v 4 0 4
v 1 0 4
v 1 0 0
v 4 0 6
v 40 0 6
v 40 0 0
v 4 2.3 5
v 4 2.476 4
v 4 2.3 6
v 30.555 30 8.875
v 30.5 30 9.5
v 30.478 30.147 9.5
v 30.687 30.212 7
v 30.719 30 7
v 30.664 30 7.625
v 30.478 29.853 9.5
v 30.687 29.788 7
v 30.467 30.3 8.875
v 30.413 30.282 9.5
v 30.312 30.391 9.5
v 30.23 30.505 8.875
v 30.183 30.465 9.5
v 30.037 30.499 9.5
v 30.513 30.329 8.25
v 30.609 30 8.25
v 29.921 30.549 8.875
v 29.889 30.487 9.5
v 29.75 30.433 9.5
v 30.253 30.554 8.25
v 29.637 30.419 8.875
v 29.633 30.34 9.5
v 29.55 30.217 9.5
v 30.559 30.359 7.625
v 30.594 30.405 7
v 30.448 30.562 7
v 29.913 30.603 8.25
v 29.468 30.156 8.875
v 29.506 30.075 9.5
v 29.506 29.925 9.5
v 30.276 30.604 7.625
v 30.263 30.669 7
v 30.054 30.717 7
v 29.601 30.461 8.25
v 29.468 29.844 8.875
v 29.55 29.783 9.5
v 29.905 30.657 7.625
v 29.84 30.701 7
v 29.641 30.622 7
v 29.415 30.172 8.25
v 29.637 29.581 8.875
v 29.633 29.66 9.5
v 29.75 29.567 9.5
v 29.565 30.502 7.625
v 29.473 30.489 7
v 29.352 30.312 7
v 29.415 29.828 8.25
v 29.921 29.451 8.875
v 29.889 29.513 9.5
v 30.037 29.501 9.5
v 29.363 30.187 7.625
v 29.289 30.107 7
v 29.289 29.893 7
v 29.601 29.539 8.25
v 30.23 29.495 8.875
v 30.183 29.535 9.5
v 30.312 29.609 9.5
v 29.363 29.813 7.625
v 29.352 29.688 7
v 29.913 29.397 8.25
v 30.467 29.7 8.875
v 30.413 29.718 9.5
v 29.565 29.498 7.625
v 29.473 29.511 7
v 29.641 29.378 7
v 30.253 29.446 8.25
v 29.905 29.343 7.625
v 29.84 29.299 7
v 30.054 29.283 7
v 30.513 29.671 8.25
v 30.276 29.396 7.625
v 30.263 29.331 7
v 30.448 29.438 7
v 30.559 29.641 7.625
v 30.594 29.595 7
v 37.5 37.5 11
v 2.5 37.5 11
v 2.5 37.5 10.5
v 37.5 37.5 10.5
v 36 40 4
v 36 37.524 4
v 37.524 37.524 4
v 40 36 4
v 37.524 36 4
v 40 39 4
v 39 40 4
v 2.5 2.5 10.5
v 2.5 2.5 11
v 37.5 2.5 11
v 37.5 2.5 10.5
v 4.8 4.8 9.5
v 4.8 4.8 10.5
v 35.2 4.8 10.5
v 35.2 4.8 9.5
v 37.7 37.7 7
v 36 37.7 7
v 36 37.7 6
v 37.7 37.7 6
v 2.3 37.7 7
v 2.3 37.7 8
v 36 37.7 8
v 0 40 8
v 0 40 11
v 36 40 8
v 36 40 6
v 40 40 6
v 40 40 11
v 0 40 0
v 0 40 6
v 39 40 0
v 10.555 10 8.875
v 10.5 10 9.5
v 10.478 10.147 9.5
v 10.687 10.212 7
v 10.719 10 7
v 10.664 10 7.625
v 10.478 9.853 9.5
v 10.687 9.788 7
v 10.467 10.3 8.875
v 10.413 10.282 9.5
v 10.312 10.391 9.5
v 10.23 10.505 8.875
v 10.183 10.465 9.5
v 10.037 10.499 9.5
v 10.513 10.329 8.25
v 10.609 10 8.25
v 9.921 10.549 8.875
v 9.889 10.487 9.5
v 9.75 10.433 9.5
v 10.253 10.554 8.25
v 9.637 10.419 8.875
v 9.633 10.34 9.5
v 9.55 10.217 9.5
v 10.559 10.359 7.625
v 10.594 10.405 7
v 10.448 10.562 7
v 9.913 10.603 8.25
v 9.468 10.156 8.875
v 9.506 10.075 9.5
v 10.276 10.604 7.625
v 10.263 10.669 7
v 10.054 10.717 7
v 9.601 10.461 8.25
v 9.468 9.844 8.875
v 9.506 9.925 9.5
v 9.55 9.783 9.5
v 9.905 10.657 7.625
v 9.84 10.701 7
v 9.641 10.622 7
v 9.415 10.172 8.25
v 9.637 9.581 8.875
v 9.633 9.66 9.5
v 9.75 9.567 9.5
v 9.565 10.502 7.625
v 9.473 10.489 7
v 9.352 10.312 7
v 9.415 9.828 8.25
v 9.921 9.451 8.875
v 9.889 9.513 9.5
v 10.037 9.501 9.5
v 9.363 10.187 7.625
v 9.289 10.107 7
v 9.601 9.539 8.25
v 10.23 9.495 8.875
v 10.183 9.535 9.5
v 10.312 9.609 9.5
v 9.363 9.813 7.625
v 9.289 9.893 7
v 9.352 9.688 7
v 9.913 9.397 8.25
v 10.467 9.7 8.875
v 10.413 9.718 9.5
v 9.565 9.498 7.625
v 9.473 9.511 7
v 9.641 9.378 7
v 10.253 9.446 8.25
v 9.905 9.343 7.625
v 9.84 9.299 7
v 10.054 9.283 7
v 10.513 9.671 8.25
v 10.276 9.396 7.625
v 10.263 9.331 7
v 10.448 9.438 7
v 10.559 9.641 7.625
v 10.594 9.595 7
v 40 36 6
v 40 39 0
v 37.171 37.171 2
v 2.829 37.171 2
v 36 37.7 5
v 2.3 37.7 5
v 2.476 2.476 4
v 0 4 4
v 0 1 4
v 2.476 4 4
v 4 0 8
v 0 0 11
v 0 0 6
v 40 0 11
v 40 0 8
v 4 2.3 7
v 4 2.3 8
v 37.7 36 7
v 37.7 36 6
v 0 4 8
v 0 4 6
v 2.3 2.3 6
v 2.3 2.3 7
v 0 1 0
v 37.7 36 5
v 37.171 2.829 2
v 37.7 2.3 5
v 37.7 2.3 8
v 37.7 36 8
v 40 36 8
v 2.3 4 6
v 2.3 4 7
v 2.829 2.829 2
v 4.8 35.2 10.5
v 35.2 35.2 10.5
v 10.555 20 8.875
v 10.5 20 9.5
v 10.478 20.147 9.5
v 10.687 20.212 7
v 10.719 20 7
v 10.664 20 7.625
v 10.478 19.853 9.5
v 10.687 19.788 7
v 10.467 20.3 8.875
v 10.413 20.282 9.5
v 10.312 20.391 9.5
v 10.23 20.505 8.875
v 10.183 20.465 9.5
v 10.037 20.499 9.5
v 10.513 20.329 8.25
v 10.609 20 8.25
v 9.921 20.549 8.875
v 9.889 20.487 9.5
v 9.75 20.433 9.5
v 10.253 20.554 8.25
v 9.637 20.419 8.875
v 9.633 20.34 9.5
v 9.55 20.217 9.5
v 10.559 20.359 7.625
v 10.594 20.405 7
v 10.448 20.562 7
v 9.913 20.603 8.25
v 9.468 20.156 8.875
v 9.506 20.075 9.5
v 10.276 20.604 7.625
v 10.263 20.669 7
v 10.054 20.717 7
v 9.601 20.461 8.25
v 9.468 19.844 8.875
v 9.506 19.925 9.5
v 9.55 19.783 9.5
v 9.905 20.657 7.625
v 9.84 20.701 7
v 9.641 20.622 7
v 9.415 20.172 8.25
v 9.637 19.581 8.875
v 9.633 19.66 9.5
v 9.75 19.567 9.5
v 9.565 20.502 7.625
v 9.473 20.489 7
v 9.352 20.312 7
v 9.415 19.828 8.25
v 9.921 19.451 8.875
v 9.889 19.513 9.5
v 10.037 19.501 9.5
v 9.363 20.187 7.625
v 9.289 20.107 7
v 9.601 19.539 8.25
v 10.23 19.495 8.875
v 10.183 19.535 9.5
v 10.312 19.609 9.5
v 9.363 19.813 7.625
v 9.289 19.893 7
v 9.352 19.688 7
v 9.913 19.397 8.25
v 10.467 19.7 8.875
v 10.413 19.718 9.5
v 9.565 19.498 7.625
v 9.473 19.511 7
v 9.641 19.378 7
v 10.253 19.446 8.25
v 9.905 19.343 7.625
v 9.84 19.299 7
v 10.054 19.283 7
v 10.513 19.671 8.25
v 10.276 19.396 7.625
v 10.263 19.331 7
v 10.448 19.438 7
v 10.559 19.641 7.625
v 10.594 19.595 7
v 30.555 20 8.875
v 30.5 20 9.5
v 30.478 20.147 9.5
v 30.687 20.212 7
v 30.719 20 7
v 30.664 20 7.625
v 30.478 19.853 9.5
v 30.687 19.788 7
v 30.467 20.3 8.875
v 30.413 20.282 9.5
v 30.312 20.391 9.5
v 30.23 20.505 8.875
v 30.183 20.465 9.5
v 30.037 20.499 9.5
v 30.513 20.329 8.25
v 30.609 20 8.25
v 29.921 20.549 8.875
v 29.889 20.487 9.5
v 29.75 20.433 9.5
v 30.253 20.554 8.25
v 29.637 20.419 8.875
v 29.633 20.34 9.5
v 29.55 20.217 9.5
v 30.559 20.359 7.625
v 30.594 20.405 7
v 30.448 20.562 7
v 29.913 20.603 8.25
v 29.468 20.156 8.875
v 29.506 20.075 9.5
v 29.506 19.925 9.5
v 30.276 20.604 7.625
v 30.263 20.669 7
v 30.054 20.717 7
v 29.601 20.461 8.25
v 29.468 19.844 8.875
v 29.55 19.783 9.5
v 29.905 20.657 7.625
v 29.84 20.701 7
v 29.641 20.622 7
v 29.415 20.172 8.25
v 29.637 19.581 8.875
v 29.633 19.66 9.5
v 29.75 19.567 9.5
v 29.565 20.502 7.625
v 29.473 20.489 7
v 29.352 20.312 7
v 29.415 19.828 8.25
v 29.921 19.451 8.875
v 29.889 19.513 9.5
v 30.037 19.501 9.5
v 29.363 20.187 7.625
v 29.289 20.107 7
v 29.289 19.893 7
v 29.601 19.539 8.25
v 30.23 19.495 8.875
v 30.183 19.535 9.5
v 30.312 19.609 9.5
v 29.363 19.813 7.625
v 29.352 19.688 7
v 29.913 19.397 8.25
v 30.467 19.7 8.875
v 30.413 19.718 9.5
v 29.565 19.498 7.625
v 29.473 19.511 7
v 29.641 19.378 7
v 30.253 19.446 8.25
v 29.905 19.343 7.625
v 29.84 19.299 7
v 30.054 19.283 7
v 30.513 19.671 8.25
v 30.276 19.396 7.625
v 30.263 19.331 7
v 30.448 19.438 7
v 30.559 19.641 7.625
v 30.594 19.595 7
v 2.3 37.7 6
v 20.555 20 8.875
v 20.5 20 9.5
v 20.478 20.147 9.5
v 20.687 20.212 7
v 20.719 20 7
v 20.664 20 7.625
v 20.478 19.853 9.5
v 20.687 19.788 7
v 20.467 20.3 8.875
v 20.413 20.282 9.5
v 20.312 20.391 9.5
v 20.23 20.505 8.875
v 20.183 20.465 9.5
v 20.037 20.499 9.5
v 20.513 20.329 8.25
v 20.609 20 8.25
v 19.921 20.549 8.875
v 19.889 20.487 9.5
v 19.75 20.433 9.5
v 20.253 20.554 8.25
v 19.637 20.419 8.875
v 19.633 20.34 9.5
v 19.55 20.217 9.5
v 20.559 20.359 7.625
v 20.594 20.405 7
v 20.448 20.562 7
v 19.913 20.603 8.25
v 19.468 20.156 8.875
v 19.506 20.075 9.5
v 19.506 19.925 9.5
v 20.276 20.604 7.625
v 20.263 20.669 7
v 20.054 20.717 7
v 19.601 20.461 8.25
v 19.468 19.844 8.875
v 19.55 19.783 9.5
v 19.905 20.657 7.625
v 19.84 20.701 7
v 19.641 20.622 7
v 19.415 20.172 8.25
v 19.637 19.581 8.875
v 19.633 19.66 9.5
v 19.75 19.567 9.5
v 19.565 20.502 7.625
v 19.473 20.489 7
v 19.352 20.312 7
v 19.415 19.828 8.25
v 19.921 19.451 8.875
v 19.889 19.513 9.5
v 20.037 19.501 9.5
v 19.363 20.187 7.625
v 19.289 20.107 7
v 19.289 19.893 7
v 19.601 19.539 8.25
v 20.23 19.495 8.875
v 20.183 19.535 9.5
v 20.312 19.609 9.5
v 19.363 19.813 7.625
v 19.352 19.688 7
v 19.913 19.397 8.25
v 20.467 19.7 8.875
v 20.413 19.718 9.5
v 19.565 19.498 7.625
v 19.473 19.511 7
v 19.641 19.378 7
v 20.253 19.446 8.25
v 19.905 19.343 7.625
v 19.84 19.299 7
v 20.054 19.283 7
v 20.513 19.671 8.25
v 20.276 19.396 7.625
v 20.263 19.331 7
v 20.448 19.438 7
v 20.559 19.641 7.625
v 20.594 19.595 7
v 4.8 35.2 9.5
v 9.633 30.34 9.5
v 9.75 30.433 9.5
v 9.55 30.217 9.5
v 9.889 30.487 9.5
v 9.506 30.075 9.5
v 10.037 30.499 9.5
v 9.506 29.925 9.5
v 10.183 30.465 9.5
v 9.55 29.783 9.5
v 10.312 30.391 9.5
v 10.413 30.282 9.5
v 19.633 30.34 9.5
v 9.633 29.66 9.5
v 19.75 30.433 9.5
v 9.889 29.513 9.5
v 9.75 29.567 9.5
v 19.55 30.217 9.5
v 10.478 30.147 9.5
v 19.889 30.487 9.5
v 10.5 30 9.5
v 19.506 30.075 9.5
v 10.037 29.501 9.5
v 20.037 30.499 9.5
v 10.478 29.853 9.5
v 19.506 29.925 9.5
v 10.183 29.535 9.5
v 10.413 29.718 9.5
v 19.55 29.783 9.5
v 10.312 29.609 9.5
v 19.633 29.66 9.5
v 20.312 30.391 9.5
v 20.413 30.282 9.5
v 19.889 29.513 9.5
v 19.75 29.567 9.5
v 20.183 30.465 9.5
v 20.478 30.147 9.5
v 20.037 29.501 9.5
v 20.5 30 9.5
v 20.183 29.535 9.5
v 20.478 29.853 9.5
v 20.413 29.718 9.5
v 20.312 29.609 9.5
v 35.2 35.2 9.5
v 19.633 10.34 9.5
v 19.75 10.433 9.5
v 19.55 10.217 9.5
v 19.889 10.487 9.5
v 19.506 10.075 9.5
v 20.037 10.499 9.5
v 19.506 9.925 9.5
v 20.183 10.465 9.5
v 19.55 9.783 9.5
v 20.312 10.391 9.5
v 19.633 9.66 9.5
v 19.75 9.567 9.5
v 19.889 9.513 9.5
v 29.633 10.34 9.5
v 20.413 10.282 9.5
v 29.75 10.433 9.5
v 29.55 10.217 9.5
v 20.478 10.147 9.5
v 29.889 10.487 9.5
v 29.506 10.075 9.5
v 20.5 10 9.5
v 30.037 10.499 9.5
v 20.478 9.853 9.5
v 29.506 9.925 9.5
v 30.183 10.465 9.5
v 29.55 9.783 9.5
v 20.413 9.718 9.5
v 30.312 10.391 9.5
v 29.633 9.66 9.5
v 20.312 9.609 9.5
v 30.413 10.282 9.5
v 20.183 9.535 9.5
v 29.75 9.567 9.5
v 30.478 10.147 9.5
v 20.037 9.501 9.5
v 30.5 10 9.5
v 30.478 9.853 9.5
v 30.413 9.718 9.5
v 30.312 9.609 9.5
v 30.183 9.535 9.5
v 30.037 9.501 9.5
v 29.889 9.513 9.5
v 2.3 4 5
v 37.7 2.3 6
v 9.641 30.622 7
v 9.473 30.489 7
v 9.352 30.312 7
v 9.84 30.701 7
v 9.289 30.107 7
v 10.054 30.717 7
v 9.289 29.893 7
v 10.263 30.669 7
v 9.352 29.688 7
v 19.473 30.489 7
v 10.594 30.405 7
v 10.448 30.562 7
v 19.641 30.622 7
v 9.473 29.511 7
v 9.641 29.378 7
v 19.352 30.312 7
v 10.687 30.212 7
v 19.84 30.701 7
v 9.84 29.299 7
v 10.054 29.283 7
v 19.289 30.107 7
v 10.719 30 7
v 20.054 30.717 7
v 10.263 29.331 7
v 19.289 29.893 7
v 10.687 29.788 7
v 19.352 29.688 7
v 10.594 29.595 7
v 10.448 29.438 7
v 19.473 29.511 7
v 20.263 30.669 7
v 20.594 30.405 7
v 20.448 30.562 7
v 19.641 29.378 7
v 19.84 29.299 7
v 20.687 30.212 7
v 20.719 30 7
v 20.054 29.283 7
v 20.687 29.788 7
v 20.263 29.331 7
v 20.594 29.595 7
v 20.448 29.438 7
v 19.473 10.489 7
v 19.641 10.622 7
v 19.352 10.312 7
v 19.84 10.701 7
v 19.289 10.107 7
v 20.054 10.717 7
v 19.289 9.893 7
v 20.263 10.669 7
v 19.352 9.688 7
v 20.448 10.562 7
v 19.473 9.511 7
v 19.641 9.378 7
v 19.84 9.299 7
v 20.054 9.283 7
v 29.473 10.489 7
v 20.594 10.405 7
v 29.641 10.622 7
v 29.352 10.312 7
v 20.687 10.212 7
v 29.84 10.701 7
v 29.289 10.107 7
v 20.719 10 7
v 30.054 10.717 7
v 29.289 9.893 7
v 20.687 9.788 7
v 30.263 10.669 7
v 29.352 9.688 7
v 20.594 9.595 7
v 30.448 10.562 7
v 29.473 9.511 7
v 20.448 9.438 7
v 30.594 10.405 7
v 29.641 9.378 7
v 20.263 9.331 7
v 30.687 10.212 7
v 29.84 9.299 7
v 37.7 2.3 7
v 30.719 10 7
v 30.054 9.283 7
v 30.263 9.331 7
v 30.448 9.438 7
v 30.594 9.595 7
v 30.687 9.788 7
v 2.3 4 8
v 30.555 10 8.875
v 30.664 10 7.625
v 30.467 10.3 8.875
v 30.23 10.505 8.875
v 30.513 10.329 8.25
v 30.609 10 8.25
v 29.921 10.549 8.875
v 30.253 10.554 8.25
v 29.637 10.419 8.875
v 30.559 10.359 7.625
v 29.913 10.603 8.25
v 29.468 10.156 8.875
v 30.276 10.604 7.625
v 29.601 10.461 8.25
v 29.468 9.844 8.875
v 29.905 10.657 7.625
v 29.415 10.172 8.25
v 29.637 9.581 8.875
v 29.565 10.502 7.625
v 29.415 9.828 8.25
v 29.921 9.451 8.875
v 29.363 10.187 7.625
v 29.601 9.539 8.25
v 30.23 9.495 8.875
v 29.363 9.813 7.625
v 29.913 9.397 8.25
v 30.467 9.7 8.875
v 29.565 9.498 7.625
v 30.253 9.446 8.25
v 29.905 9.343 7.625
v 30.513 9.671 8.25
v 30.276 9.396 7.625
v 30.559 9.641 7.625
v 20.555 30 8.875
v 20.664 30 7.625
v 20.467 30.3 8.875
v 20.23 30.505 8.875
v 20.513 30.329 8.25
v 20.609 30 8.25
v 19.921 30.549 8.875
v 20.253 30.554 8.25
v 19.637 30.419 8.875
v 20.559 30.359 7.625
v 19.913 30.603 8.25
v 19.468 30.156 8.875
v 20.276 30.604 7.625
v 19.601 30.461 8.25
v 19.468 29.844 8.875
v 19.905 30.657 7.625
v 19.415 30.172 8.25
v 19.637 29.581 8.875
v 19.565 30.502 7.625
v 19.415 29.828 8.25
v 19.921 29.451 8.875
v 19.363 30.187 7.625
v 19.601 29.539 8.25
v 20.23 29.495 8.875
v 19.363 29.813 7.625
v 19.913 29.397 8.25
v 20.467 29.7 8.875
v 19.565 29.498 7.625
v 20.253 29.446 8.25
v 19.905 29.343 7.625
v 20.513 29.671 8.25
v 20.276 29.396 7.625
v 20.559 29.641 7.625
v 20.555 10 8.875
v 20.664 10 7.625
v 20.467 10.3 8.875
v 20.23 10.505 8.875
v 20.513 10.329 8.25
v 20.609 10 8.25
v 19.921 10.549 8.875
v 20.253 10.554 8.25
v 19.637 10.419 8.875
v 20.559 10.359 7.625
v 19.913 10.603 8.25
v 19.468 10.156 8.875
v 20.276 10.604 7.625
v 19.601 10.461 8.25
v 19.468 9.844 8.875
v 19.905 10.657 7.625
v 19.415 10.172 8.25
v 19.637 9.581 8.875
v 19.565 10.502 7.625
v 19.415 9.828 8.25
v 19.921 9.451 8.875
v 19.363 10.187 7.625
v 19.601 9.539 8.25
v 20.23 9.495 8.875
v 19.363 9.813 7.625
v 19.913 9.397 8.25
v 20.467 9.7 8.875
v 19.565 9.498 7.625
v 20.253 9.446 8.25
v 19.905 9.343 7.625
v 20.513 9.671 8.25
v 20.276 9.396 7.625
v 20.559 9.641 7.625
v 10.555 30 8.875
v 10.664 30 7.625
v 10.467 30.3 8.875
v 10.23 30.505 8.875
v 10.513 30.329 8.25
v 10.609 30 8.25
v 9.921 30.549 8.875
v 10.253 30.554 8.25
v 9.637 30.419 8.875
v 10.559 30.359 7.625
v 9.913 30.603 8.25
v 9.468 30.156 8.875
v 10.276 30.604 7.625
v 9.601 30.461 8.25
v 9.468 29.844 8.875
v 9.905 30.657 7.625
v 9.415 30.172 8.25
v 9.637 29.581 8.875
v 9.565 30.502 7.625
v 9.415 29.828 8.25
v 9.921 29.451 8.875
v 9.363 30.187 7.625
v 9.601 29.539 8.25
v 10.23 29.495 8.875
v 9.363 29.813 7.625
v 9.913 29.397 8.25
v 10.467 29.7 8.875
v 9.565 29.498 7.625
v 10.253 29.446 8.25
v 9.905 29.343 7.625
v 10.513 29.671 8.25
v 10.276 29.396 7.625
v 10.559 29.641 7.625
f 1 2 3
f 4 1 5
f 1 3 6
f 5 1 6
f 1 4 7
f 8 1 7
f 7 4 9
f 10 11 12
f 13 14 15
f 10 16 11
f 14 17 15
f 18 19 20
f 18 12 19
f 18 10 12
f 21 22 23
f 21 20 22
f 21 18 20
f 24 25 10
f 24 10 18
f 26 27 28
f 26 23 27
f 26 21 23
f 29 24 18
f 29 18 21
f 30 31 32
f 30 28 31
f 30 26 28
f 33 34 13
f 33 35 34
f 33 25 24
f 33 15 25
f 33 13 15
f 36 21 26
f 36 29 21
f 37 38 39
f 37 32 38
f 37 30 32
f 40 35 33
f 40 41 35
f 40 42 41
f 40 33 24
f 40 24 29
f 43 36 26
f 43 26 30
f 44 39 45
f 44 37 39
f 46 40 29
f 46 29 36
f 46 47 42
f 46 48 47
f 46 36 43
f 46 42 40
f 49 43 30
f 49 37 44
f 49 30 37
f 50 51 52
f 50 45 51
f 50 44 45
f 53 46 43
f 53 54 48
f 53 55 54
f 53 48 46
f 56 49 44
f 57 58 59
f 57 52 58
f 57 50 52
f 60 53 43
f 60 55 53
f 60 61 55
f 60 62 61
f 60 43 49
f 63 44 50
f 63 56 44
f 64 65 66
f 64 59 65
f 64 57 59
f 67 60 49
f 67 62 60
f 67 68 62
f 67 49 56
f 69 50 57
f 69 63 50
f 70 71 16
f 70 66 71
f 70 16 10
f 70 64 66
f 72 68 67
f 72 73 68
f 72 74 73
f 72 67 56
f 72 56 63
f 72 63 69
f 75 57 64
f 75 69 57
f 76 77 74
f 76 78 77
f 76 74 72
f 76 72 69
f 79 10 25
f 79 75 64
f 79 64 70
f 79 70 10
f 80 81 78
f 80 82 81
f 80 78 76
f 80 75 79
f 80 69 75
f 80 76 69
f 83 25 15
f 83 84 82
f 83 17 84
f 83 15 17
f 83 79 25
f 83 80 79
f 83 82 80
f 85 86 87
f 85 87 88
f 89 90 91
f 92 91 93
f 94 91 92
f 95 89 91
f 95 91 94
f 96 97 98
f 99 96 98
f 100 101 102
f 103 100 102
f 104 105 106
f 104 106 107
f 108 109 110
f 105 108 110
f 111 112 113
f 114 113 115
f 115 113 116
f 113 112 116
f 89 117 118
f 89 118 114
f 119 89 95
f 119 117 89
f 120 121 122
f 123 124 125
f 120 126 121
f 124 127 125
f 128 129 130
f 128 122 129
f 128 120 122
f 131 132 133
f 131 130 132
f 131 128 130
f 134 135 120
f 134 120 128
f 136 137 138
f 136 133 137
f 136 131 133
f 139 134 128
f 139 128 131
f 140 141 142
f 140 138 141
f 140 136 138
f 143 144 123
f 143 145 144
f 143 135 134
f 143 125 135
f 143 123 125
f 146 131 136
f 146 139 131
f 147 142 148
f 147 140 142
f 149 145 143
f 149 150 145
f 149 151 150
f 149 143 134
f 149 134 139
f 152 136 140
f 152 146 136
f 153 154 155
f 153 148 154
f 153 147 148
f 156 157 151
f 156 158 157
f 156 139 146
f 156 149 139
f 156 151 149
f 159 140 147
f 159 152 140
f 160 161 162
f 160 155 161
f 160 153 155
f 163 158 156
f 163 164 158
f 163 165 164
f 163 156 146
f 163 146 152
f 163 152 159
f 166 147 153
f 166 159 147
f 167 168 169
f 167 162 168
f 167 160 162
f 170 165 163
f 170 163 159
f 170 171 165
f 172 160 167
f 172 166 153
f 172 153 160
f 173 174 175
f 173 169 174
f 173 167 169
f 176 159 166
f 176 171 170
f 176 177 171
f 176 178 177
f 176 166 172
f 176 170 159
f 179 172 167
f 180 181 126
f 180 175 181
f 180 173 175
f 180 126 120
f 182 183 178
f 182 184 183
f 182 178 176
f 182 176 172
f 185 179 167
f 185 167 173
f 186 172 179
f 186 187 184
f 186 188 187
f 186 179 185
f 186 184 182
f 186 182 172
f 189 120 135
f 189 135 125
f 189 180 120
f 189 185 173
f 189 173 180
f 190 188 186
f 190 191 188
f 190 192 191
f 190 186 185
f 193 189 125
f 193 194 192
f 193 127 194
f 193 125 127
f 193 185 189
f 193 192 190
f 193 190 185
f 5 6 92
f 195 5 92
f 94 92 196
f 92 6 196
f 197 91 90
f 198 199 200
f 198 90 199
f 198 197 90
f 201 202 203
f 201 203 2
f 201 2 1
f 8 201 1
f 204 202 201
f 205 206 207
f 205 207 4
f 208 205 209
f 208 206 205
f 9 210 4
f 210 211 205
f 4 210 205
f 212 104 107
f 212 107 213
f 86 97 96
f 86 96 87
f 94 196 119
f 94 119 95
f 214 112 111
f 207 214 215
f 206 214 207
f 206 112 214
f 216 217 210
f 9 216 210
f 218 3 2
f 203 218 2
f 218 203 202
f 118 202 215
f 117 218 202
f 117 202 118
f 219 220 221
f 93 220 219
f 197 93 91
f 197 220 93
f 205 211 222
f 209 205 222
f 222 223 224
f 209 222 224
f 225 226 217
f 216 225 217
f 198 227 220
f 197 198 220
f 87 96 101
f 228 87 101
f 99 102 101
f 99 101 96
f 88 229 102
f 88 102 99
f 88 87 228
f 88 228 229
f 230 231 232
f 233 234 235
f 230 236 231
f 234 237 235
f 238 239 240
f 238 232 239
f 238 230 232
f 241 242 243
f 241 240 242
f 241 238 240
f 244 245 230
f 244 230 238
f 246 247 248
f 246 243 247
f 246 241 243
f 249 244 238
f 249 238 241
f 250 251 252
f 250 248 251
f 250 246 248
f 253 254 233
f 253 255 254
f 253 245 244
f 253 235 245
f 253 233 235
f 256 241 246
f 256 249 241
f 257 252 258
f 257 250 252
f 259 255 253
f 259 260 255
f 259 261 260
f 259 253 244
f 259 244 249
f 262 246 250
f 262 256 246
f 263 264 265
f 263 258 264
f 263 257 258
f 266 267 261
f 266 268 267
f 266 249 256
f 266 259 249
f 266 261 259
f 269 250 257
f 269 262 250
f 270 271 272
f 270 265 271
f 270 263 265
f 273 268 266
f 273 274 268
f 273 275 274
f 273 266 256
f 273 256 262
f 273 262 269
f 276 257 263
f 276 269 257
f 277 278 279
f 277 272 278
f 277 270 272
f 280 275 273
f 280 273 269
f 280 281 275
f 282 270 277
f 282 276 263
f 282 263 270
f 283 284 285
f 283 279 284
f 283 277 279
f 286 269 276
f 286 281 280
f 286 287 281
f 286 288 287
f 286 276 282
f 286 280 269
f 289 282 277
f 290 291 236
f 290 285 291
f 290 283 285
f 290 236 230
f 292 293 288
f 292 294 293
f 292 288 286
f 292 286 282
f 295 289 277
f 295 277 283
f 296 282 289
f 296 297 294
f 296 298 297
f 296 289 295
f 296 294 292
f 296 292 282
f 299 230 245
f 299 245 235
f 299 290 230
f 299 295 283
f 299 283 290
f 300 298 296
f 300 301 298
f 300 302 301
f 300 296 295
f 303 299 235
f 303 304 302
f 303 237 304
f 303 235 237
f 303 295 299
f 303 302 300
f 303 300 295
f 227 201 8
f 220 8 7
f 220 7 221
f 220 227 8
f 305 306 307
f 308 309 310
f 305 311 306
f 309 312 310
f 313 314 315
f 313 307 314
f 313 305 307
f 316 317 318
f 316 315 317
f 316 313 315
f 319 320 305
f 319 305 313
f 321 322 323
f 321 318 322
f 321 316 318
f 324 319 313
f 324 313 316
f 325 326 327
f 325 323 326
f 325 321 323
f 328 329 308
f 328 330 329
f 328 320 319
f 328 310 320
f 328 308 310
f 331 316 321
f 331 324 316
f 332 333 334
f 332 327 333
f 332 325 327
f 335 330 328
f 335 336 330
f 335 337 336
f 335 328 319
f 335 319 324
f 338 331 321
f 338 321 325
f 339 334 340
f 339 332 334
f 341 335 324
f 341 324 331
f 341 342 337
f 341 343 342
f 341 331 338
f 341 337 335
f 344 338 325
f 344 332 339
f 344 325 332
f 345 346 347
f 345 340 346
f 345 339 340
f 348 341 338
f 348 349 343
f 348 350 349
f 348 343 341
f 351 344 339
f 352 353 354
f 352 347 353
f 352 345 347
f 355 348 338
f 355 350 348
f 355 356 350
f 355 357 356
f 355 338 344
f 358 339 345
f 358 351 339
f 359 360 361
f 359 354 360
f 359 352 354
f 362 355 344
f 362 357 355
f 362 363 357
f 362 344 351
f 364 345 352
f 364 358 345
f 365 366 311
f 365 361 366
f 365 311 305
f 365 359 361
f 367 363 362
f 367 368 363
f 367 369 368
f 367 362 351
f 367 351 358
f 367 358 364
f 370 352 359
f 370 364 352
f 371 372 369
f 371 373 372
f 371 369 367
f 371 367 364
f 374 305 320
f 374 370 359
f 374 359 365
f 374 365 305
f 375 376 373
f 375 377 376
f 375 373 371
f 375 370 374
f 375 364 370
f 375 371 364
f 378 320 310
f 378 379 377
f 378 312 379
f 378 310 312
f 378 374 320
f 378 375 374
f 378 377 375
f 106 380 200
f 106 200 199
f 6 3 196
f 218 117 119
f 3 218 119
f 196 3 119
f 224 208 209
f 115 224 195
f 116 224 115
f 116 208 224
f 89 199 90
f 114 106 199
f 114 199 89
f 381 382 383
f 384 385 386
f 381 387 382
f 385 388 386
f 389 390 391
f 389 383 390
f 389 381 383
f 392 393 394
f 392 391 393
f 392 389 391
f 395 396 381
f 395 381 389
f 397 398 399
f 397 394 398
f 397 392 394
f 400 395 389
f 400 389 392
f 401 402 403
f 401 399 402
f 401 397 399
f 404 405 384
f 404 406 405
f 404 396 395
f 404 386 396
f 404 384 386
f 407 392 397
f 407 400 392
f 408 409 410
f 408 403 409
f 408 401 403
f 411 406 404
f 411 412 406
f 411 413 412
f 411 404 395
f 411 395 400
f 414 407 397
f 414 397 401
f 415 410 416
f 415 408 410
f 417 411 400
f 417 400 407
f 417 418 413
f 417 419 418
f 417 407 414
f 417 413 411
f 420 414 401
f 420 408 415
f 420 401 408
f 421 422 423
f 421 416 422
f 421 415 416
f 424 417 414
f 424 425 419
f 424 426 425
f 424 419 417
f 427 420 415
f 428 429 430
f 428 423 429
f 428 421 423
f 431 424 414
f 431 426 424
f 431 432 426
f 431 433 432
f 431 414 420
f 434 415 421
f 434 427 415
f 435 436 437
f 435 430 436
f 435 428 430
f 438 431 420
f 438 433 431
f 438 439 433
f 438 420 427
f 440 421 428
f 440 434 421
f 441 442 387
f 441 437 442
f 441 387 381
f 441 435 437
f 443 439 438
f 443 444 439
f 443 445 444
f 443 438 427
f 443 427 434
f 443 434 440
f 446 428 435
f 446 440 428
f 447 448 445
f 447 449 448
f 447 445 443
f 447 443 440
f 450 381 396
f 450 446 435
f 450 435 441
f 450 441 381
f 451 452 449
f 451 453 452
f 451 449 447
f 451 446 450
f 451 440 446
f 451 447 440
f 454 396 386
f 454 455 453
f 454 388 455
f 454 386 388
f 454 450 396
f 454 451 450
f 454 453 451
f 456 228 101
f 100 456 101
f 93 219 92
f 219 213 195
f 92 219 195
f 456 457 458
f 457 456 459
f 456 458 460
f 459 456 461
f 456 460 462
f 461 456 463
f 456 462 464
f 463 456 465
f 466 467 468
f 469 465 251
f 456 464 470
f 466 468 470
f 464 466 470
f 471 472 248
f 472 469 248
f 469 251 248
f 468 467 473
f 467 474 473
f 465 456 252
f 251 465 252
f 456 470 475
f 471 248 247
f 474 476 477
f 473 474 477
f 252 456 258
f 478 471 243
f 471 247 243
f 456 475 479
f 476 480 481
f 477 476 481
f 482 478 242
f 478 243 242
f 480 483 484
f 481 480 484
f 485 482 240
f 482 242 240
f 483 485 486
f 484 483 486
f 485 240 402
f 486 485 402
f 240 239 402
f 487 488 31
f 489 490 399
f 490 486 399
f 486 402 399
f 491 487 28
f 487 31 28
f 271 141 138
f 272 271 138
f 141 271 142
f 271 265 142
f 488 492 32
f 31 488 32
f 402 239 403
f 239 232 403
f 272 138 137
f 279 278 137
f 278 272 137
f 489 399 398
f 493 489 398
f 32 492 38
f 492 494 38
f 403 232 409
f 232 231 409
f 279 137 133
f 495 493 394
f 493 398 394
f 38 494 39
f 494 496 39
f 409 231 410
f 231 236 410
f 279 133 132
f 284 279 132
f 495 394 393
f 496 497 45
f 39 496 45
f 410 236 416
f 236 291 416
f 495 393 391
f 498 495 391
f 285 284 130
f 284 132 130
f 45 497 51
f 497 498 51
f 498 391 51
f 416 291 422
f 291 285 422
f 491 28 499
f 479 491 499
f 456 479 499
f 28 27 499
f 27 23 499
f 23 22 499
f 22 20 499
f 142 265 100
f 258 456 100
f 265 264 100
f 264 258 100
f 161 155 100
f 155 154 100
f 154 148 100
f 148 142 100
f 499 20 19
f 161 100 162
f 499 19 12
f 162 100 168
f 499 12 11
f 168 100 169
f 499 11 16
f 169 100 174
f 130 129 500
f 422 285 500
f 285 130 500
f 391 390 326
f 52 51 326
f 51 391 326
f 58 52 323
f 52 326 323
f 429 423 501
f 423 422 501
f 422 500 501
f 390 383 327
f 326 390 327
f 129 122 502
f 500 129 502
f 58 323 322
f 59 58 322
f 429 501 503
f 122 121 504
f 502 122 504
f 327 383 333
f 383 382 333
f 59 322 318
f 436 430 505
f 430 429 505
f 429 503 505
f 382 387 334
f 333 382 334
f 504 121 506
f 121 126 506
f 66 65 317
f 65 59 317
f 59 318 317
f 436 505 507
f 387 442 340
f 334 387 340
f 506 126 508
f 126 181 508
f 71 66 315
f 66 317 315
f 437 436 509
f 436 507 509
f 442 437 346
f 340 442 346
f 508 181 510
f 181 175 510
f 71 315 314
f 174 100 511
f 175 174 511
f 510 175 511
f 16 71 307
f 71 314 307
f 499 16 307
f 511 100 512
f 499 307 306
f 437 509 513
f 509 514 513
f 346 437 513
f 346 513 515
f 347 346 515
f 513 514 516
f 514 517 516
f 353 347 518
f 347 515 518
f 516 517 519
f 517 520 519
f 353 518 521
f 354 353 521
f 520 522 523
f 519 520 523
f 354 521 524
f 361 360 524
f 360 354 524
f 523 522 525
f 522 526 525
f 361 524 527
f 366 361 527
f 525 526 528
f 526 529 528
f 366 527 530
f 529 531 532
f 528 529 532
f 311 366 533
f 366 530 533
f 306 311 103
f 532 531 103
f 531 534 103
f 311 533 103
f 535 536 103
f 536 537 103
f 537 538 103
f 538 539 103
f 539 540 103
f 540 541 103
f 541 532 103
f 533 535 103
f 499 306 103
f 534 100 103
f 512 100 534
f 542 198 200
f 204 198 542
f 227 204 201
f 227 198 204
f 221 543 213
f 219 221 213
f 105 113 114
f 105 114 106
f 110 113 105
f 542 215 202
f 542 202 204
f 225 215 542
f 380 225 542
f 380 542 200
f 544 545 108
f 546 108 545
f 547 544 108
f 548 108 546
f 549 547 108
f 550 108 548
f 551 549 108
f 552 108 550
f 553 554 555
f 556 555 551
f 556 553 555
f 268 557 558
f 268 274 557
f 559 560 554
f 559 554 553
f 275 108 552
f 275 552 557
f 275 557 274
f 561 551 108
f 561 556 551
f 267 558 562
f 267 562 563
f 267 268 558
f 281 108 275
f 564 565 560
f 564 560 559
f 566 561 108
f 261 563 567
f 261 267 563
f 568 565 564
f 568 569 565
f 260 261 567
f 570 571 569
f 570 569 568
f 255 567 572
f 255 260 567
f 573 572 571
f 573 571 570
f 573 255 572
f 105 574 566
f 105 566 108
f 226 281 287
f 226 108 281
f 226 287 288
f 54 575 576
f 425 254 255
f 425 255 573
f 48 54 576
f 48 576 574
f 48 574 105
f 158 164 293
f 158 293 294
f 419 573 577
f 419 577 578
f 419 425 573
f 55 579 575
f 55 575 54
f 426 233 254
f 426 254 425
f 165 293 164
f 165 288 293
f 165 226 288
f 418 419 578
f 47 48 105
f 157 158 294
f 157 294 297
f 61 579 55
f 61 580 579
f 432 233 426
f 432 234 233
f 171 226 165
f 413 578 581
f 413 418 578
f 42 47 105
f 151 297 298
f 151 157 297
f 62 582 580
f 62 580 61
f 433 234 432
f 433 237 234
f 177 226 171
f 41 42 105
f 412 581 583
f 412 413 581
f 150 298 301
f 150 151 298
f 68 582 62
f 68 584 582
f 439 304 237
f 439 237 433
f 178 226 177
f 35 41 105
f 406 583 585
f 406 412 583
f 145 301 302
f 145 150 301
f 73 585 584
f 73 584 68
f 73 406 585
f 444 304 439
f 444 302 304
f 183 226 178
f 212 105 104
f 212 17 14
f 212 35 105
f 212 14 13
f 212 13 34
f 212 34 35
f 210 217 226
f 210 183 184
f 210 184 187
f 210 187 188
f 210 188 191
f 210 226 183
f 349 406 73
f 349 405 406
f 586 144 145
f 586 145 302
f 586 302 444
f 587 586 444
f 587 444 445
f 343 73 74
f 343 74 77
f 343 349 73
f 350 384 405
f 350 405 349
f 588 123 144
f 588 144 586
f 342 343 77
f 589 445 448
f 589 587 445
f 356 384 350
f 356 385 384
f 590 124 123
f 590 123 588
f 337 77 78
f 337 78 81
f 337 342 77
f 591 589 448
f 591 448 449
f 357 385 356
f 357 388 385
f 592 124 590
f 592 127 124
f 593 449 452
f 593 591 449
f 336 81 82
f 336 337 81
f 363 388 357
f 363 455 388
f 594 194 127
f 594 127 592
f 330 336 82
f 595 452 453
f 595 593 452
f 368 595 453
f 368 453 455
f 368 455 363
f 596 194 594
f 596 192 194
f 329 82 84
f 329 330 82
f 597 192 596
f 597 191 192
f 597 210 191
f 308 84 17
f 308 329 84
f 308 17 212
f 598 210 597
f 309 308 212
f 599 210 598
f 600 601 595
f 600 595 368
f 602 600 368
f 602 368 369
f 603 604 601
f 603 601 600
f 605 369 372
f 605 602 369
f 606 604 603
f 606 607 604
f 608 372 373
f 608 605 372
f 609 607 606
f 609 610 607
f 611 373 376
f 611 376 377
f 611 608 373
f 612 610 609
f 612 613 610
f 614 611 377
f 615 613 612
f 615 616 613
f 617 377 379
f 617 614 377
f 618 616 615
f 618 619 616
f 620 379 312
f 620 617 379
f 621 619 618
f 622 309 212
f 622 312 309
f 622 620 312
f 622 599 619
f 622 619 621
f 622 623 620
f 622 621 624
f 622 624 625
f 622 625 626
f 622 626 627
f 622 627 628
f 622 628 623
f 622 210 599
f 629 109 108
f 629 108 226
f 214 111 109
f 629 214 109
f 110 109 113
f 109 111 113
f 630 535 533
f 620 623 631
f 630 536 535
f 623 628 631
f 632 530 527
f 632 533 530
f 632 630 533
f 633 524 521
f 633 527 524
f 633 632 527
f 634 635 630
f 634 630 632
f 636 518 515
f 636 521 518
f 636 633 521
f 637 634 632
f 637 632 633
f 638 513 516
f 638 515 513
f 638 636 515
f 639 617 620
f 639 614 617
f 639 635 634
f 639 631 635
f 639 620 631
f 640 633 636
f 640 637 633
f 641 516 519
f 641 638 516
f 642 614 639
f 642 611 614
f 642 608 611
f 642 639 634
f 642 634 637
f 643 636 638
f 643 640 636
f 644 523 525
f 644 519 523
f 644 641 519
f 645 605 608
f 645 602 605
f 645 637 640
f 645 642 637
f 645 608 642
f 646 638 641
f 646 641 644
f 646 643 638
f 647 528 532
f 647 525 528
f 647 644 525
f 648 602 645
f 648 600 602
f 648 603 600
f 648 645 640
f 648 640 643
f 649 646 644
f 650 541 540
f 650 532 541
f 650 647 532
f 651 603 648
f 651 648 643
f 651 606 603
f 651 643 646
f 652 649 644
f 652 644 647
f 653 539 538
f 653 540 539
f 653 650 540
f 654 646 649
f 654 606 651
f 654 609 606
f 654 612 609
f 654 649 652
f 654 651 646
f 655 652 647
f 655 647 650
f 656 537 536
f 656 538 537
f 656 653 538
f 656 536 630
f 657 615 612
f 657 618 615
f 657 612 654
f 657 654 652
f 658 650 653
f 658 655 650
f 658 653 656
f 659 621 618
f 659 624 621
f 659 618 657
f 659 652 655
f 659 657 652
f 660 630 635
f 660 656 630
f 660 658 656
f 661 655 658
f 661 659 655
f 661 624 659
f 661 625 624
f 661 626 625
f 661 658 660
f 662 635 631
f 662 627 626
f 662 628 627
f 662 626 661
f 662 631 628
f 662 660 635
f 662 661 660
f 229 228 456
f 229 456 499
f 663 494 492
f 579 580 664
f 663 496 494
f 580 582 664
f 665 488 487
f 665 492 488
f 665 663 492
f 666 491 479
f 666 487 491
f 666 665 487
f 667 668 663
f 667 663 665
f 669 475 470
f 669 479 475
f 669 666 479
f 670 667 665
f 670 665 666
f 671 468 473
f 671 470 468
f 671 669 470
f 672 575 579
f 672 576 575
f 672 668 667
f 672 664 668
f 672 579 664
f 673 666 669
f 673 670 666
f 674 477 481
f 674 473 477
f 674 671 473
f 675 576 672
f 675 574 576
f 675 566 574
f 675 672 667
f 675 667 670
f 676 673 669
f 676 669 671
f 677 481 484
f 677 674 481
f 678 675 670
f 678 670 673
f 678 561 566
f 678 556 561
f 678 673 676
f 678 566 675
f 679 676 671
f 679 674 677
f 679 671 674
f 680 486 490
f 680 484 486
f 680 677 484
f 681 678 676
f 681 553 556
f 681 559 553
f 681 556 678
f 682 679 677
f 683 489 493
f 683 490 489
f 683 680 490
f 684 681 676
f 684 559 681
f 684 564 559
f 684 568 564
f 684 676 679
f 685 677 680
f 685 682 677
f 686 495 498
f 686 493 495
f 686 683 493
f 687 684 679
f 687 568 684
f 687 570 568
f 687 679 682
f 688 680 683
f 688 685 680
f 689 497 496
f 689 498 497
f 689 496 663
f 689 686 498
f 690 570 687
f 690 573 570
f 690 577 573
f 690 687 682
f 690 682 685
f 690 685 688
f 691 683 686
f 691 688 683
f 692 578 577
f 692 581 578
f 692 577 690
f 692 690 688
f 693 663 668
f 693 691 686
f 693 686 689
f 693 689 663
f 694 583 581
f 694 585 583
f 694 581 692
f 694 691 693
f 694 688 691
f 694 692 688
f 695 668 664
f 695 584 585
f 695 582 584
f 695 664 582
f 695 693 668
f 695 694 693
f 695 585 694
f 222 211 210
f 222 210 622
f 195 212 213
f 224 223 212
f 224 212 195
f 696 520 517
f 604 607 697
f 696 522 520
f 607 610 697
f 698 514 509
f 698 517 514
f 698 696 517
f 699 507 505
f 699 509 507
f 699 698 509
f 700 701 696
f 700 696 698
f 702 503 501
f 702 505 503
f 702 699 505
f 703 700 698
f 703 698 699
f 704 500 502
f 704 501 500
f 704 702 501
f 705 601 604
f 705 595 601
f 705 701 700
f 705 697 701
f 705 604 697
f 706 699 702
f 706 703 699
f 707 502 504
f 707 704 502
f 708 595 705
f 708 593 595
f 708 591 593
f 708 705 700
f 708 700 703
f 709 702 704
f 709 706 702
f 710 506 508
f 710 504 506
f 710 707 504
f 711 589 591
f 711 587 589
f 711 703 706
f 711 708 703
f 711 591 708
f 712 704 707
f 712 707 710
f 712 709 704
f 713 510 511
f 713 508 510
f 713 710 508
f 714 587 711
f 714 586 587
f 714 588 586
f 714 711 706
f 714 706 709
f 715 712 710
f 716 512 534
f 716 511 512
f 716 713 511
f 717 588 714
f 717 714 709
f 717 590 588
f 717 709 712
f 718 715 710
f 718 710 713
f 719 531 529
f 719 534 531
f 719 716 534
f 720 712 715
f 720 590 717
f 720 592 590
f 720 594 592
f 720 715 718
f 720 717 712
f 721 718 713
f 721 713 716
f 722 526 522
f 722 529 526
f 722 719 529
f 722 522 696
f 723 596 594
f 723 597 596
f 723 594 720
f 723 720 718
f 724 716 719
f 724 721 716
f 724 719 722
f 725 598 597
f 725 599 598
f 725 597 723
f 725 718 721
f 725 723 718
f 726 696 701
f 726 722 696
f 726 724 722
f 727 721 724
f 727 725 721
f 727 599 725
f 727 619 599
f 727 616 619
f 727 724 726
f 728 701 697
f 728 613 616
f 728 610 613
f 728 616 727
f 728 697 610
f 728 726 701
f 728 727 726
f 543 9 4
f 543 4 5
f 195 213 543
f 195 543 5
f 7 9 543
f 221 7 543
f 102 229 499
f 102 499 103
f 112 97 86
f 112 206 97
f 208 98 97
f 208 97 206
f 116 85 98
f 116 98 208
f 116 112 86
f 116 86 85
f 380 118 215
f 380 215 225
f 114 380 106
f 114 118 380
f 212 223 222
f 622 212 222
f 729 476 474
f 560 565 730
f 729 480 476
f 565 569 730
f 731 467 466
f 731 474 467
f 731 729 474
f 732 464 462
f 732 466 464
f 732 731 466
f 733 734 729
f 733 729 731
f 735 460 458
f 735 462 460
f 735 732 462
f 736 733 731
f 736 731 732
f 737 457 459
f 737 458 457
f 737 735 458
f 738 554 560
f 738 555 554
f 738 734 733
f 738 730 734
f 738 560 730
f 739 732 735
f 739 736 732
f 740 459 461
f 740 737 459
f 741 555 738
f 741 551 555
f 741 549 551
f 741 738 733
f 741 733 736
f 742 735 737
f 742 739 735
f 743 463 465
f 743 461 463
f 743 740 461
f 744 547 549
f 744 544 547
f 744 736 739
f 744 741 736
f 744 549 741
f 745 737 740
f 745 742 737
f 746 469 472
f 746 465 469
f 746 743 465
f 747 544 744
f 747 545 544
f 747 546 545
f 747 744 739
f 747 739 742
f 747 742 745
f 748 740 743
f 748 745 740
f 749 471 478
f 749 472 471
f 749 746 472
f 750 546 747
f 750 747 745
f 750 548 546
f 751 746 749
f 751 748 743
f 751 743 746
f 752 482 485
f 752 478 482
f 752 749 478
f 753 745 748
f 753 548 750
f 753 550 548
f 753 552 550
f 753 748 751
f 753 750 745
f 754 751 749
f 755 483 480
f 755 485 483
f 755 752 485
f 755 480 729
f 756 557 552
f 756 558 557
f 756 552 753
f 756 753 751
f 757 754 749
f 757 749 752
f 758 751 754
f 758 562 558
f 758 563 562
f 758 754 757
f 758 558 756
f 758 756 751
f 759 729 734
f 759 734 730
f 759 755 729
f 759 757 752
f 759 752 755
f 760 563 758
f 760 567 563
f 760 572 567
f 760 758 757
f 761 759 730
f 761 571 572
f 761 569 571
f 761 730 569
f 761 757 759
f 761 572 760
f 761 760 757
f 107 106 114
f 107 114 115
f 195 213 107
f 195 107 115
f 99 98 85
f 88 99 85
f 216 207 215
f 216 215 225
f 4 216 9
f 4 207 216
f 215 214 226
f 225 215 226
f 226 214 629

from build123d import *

# Parameters (mm, degrees)
F0_W      = 40
F0_H      = 40
F1_DEPTH  = 6
F4_W      = 40
F4_H      = 40
F5_DEPTH  = 3
F2_W      = 35.4
F2_H      = 35.4
F6_DEPTH  = 1
F6_FACE_W = 35.4
F6_FACE_H = 35.4
F7_DEPTH  = 3
F7_TAPER  = 10
F9_W      = 35.4
F9_H      = 35.4
F10_DEPTH = 1
F11_T     = -2.5
F12_R     = 0.5
F13_DEPTH = 2.5
F13_TAPER = -5
F14_SIZE  = 1
F17_W     = 4
F17_H     = 4
F18_DEPTH = 2
F19_W     = 35.4
F19_H     = 35.4
F20_DEPTH = 25
F15_W     = 4
F15_H     = 4
F21_DEPTH = 2


with BuildPart() as f1:
    # F0 (on Top) → F1 (new body)
    with BuildSketch(Plane.XY):
        with Locations((20, 20)):
            Rectangle(F0_W, F0_H)
    extrude(amount=F1_DEPTH)

    # F2 (on face) → F6 (cut)
    with BuildSketch(Plane.XY.offset(6)):
        with Locations((20, 20)):
            Rectangle(F2_W, F2_H)
    extrude(amount=-F6_DEPTH, mode=Mode.SUBTRACT)

    # F6_face (on face) → F7 (cut)
    with BuildSketch(Plane(origin=(20, 20, 5), x_dir=(1, 0, 0), z_dir=(0, 0, 1))):
        Rectangle(F6_FACE_W, F6_FACE_H)
    extrude(amount=-F7_DEPTH, taper=F7_TAPER, mode=Mode.SUBTRACT)

    # F14
    f14_edges = [f1.edges().sort_by_distance(p)[0] for p in [
        (0, 0, 3),
        (40, 40, 3),
    ]]
    chamfer(f14_edges, length=F14_SIZE)

    # F15 (on face) → F21 (cut)
    with BuildSketch(Plane.XY.offset(6)):
        with Locations((2, 2)):
            Rectangle(F15_W, F15_H)
        with Locations((38, 38)):
            Rectangle(F15_W, F15_H)
    extrude(amount=-F21_DEPTH, mode=Mode.SUBTRACT)


with BuildPart() as f5:
    # F4 (on offset) → F5 (new body)
    with BuildSketch(Plane.XY.offset(11)):
        with Locations((20, 20)):
            Rectangle(F4_W, F4_H)
    extrude(amount=-F5_DEPTH)

    # F9 (on face) → F10 (join)
    with BuildSketch(Plane(origin=(0, 0, 8), x_dir=(1, 0, 0), z_dir=(0, 0, -1))):
        with Locations((20, -20)):
            Rectangle(F9_W, F9_H)
    extrude(amount=F10_DEPTH)

    # F11
    f11_openings = [f5.faces().sort_by_distance(p)[0] for p in [
        (20, 20, 11),
    ]]
    offset(amount=F11_T, openings=f11_openings, kind=Kind.INTERSECTION)

    # F12 (on face) → F13 (cut, through all)
    with BuildSketch(Plane.XY.offset(9.5)):
        with Locations((10, 30)):
            Circle(F12_R)
        with Locations((20, 30)):
            Circle(F12_R)
        with Locations((30, 30)):
            Circle(F12_R)
        with Locations((10, 20)):
            Circle(F12_R)
        with Locations((10, 10)):
            Circle(F12_R)
        with Locations((20, 20)):
            Circle(F12_R)
        with Locations((20, 10)):
            Circle(F12_R)
        with Locations((30, 20)):
            Circle(F12_R)
        with Locations((30, 10)):
            Circle(F12_R)
    extrude(amount=-F13_DEPTH, taper=F13_TAPER, mode=Mode.SUBTRACT)

    # F17 (on face) → F18 (join)
    with BuildSketch(Plane(origin=(0, 0, 8), x_dir=(1, 0, 0), z_dir=(0, 0, -1))):
        with Locations((2, -2)):
            Rectangle(F17_W, F17_H)
        with Locations((38, -38)):
            Rectangle(F17_W, F17_H)
    extrude(amount=F18_DEPTH)

    # F19 (on face) → F20 (cut)
    with BuildSketch(Plane(origin=(0, 0, 7), x_dir=(1, 0, 0), z_dir=(0, 0, -1))):
        with Locations((20, -20)):
            Rectangle(F19_W, F19_H)
    extrude(amount=F20_DEPTH, mode=Mode.SUBTRACT)


solid = Compound([f1.part, f5.part])
